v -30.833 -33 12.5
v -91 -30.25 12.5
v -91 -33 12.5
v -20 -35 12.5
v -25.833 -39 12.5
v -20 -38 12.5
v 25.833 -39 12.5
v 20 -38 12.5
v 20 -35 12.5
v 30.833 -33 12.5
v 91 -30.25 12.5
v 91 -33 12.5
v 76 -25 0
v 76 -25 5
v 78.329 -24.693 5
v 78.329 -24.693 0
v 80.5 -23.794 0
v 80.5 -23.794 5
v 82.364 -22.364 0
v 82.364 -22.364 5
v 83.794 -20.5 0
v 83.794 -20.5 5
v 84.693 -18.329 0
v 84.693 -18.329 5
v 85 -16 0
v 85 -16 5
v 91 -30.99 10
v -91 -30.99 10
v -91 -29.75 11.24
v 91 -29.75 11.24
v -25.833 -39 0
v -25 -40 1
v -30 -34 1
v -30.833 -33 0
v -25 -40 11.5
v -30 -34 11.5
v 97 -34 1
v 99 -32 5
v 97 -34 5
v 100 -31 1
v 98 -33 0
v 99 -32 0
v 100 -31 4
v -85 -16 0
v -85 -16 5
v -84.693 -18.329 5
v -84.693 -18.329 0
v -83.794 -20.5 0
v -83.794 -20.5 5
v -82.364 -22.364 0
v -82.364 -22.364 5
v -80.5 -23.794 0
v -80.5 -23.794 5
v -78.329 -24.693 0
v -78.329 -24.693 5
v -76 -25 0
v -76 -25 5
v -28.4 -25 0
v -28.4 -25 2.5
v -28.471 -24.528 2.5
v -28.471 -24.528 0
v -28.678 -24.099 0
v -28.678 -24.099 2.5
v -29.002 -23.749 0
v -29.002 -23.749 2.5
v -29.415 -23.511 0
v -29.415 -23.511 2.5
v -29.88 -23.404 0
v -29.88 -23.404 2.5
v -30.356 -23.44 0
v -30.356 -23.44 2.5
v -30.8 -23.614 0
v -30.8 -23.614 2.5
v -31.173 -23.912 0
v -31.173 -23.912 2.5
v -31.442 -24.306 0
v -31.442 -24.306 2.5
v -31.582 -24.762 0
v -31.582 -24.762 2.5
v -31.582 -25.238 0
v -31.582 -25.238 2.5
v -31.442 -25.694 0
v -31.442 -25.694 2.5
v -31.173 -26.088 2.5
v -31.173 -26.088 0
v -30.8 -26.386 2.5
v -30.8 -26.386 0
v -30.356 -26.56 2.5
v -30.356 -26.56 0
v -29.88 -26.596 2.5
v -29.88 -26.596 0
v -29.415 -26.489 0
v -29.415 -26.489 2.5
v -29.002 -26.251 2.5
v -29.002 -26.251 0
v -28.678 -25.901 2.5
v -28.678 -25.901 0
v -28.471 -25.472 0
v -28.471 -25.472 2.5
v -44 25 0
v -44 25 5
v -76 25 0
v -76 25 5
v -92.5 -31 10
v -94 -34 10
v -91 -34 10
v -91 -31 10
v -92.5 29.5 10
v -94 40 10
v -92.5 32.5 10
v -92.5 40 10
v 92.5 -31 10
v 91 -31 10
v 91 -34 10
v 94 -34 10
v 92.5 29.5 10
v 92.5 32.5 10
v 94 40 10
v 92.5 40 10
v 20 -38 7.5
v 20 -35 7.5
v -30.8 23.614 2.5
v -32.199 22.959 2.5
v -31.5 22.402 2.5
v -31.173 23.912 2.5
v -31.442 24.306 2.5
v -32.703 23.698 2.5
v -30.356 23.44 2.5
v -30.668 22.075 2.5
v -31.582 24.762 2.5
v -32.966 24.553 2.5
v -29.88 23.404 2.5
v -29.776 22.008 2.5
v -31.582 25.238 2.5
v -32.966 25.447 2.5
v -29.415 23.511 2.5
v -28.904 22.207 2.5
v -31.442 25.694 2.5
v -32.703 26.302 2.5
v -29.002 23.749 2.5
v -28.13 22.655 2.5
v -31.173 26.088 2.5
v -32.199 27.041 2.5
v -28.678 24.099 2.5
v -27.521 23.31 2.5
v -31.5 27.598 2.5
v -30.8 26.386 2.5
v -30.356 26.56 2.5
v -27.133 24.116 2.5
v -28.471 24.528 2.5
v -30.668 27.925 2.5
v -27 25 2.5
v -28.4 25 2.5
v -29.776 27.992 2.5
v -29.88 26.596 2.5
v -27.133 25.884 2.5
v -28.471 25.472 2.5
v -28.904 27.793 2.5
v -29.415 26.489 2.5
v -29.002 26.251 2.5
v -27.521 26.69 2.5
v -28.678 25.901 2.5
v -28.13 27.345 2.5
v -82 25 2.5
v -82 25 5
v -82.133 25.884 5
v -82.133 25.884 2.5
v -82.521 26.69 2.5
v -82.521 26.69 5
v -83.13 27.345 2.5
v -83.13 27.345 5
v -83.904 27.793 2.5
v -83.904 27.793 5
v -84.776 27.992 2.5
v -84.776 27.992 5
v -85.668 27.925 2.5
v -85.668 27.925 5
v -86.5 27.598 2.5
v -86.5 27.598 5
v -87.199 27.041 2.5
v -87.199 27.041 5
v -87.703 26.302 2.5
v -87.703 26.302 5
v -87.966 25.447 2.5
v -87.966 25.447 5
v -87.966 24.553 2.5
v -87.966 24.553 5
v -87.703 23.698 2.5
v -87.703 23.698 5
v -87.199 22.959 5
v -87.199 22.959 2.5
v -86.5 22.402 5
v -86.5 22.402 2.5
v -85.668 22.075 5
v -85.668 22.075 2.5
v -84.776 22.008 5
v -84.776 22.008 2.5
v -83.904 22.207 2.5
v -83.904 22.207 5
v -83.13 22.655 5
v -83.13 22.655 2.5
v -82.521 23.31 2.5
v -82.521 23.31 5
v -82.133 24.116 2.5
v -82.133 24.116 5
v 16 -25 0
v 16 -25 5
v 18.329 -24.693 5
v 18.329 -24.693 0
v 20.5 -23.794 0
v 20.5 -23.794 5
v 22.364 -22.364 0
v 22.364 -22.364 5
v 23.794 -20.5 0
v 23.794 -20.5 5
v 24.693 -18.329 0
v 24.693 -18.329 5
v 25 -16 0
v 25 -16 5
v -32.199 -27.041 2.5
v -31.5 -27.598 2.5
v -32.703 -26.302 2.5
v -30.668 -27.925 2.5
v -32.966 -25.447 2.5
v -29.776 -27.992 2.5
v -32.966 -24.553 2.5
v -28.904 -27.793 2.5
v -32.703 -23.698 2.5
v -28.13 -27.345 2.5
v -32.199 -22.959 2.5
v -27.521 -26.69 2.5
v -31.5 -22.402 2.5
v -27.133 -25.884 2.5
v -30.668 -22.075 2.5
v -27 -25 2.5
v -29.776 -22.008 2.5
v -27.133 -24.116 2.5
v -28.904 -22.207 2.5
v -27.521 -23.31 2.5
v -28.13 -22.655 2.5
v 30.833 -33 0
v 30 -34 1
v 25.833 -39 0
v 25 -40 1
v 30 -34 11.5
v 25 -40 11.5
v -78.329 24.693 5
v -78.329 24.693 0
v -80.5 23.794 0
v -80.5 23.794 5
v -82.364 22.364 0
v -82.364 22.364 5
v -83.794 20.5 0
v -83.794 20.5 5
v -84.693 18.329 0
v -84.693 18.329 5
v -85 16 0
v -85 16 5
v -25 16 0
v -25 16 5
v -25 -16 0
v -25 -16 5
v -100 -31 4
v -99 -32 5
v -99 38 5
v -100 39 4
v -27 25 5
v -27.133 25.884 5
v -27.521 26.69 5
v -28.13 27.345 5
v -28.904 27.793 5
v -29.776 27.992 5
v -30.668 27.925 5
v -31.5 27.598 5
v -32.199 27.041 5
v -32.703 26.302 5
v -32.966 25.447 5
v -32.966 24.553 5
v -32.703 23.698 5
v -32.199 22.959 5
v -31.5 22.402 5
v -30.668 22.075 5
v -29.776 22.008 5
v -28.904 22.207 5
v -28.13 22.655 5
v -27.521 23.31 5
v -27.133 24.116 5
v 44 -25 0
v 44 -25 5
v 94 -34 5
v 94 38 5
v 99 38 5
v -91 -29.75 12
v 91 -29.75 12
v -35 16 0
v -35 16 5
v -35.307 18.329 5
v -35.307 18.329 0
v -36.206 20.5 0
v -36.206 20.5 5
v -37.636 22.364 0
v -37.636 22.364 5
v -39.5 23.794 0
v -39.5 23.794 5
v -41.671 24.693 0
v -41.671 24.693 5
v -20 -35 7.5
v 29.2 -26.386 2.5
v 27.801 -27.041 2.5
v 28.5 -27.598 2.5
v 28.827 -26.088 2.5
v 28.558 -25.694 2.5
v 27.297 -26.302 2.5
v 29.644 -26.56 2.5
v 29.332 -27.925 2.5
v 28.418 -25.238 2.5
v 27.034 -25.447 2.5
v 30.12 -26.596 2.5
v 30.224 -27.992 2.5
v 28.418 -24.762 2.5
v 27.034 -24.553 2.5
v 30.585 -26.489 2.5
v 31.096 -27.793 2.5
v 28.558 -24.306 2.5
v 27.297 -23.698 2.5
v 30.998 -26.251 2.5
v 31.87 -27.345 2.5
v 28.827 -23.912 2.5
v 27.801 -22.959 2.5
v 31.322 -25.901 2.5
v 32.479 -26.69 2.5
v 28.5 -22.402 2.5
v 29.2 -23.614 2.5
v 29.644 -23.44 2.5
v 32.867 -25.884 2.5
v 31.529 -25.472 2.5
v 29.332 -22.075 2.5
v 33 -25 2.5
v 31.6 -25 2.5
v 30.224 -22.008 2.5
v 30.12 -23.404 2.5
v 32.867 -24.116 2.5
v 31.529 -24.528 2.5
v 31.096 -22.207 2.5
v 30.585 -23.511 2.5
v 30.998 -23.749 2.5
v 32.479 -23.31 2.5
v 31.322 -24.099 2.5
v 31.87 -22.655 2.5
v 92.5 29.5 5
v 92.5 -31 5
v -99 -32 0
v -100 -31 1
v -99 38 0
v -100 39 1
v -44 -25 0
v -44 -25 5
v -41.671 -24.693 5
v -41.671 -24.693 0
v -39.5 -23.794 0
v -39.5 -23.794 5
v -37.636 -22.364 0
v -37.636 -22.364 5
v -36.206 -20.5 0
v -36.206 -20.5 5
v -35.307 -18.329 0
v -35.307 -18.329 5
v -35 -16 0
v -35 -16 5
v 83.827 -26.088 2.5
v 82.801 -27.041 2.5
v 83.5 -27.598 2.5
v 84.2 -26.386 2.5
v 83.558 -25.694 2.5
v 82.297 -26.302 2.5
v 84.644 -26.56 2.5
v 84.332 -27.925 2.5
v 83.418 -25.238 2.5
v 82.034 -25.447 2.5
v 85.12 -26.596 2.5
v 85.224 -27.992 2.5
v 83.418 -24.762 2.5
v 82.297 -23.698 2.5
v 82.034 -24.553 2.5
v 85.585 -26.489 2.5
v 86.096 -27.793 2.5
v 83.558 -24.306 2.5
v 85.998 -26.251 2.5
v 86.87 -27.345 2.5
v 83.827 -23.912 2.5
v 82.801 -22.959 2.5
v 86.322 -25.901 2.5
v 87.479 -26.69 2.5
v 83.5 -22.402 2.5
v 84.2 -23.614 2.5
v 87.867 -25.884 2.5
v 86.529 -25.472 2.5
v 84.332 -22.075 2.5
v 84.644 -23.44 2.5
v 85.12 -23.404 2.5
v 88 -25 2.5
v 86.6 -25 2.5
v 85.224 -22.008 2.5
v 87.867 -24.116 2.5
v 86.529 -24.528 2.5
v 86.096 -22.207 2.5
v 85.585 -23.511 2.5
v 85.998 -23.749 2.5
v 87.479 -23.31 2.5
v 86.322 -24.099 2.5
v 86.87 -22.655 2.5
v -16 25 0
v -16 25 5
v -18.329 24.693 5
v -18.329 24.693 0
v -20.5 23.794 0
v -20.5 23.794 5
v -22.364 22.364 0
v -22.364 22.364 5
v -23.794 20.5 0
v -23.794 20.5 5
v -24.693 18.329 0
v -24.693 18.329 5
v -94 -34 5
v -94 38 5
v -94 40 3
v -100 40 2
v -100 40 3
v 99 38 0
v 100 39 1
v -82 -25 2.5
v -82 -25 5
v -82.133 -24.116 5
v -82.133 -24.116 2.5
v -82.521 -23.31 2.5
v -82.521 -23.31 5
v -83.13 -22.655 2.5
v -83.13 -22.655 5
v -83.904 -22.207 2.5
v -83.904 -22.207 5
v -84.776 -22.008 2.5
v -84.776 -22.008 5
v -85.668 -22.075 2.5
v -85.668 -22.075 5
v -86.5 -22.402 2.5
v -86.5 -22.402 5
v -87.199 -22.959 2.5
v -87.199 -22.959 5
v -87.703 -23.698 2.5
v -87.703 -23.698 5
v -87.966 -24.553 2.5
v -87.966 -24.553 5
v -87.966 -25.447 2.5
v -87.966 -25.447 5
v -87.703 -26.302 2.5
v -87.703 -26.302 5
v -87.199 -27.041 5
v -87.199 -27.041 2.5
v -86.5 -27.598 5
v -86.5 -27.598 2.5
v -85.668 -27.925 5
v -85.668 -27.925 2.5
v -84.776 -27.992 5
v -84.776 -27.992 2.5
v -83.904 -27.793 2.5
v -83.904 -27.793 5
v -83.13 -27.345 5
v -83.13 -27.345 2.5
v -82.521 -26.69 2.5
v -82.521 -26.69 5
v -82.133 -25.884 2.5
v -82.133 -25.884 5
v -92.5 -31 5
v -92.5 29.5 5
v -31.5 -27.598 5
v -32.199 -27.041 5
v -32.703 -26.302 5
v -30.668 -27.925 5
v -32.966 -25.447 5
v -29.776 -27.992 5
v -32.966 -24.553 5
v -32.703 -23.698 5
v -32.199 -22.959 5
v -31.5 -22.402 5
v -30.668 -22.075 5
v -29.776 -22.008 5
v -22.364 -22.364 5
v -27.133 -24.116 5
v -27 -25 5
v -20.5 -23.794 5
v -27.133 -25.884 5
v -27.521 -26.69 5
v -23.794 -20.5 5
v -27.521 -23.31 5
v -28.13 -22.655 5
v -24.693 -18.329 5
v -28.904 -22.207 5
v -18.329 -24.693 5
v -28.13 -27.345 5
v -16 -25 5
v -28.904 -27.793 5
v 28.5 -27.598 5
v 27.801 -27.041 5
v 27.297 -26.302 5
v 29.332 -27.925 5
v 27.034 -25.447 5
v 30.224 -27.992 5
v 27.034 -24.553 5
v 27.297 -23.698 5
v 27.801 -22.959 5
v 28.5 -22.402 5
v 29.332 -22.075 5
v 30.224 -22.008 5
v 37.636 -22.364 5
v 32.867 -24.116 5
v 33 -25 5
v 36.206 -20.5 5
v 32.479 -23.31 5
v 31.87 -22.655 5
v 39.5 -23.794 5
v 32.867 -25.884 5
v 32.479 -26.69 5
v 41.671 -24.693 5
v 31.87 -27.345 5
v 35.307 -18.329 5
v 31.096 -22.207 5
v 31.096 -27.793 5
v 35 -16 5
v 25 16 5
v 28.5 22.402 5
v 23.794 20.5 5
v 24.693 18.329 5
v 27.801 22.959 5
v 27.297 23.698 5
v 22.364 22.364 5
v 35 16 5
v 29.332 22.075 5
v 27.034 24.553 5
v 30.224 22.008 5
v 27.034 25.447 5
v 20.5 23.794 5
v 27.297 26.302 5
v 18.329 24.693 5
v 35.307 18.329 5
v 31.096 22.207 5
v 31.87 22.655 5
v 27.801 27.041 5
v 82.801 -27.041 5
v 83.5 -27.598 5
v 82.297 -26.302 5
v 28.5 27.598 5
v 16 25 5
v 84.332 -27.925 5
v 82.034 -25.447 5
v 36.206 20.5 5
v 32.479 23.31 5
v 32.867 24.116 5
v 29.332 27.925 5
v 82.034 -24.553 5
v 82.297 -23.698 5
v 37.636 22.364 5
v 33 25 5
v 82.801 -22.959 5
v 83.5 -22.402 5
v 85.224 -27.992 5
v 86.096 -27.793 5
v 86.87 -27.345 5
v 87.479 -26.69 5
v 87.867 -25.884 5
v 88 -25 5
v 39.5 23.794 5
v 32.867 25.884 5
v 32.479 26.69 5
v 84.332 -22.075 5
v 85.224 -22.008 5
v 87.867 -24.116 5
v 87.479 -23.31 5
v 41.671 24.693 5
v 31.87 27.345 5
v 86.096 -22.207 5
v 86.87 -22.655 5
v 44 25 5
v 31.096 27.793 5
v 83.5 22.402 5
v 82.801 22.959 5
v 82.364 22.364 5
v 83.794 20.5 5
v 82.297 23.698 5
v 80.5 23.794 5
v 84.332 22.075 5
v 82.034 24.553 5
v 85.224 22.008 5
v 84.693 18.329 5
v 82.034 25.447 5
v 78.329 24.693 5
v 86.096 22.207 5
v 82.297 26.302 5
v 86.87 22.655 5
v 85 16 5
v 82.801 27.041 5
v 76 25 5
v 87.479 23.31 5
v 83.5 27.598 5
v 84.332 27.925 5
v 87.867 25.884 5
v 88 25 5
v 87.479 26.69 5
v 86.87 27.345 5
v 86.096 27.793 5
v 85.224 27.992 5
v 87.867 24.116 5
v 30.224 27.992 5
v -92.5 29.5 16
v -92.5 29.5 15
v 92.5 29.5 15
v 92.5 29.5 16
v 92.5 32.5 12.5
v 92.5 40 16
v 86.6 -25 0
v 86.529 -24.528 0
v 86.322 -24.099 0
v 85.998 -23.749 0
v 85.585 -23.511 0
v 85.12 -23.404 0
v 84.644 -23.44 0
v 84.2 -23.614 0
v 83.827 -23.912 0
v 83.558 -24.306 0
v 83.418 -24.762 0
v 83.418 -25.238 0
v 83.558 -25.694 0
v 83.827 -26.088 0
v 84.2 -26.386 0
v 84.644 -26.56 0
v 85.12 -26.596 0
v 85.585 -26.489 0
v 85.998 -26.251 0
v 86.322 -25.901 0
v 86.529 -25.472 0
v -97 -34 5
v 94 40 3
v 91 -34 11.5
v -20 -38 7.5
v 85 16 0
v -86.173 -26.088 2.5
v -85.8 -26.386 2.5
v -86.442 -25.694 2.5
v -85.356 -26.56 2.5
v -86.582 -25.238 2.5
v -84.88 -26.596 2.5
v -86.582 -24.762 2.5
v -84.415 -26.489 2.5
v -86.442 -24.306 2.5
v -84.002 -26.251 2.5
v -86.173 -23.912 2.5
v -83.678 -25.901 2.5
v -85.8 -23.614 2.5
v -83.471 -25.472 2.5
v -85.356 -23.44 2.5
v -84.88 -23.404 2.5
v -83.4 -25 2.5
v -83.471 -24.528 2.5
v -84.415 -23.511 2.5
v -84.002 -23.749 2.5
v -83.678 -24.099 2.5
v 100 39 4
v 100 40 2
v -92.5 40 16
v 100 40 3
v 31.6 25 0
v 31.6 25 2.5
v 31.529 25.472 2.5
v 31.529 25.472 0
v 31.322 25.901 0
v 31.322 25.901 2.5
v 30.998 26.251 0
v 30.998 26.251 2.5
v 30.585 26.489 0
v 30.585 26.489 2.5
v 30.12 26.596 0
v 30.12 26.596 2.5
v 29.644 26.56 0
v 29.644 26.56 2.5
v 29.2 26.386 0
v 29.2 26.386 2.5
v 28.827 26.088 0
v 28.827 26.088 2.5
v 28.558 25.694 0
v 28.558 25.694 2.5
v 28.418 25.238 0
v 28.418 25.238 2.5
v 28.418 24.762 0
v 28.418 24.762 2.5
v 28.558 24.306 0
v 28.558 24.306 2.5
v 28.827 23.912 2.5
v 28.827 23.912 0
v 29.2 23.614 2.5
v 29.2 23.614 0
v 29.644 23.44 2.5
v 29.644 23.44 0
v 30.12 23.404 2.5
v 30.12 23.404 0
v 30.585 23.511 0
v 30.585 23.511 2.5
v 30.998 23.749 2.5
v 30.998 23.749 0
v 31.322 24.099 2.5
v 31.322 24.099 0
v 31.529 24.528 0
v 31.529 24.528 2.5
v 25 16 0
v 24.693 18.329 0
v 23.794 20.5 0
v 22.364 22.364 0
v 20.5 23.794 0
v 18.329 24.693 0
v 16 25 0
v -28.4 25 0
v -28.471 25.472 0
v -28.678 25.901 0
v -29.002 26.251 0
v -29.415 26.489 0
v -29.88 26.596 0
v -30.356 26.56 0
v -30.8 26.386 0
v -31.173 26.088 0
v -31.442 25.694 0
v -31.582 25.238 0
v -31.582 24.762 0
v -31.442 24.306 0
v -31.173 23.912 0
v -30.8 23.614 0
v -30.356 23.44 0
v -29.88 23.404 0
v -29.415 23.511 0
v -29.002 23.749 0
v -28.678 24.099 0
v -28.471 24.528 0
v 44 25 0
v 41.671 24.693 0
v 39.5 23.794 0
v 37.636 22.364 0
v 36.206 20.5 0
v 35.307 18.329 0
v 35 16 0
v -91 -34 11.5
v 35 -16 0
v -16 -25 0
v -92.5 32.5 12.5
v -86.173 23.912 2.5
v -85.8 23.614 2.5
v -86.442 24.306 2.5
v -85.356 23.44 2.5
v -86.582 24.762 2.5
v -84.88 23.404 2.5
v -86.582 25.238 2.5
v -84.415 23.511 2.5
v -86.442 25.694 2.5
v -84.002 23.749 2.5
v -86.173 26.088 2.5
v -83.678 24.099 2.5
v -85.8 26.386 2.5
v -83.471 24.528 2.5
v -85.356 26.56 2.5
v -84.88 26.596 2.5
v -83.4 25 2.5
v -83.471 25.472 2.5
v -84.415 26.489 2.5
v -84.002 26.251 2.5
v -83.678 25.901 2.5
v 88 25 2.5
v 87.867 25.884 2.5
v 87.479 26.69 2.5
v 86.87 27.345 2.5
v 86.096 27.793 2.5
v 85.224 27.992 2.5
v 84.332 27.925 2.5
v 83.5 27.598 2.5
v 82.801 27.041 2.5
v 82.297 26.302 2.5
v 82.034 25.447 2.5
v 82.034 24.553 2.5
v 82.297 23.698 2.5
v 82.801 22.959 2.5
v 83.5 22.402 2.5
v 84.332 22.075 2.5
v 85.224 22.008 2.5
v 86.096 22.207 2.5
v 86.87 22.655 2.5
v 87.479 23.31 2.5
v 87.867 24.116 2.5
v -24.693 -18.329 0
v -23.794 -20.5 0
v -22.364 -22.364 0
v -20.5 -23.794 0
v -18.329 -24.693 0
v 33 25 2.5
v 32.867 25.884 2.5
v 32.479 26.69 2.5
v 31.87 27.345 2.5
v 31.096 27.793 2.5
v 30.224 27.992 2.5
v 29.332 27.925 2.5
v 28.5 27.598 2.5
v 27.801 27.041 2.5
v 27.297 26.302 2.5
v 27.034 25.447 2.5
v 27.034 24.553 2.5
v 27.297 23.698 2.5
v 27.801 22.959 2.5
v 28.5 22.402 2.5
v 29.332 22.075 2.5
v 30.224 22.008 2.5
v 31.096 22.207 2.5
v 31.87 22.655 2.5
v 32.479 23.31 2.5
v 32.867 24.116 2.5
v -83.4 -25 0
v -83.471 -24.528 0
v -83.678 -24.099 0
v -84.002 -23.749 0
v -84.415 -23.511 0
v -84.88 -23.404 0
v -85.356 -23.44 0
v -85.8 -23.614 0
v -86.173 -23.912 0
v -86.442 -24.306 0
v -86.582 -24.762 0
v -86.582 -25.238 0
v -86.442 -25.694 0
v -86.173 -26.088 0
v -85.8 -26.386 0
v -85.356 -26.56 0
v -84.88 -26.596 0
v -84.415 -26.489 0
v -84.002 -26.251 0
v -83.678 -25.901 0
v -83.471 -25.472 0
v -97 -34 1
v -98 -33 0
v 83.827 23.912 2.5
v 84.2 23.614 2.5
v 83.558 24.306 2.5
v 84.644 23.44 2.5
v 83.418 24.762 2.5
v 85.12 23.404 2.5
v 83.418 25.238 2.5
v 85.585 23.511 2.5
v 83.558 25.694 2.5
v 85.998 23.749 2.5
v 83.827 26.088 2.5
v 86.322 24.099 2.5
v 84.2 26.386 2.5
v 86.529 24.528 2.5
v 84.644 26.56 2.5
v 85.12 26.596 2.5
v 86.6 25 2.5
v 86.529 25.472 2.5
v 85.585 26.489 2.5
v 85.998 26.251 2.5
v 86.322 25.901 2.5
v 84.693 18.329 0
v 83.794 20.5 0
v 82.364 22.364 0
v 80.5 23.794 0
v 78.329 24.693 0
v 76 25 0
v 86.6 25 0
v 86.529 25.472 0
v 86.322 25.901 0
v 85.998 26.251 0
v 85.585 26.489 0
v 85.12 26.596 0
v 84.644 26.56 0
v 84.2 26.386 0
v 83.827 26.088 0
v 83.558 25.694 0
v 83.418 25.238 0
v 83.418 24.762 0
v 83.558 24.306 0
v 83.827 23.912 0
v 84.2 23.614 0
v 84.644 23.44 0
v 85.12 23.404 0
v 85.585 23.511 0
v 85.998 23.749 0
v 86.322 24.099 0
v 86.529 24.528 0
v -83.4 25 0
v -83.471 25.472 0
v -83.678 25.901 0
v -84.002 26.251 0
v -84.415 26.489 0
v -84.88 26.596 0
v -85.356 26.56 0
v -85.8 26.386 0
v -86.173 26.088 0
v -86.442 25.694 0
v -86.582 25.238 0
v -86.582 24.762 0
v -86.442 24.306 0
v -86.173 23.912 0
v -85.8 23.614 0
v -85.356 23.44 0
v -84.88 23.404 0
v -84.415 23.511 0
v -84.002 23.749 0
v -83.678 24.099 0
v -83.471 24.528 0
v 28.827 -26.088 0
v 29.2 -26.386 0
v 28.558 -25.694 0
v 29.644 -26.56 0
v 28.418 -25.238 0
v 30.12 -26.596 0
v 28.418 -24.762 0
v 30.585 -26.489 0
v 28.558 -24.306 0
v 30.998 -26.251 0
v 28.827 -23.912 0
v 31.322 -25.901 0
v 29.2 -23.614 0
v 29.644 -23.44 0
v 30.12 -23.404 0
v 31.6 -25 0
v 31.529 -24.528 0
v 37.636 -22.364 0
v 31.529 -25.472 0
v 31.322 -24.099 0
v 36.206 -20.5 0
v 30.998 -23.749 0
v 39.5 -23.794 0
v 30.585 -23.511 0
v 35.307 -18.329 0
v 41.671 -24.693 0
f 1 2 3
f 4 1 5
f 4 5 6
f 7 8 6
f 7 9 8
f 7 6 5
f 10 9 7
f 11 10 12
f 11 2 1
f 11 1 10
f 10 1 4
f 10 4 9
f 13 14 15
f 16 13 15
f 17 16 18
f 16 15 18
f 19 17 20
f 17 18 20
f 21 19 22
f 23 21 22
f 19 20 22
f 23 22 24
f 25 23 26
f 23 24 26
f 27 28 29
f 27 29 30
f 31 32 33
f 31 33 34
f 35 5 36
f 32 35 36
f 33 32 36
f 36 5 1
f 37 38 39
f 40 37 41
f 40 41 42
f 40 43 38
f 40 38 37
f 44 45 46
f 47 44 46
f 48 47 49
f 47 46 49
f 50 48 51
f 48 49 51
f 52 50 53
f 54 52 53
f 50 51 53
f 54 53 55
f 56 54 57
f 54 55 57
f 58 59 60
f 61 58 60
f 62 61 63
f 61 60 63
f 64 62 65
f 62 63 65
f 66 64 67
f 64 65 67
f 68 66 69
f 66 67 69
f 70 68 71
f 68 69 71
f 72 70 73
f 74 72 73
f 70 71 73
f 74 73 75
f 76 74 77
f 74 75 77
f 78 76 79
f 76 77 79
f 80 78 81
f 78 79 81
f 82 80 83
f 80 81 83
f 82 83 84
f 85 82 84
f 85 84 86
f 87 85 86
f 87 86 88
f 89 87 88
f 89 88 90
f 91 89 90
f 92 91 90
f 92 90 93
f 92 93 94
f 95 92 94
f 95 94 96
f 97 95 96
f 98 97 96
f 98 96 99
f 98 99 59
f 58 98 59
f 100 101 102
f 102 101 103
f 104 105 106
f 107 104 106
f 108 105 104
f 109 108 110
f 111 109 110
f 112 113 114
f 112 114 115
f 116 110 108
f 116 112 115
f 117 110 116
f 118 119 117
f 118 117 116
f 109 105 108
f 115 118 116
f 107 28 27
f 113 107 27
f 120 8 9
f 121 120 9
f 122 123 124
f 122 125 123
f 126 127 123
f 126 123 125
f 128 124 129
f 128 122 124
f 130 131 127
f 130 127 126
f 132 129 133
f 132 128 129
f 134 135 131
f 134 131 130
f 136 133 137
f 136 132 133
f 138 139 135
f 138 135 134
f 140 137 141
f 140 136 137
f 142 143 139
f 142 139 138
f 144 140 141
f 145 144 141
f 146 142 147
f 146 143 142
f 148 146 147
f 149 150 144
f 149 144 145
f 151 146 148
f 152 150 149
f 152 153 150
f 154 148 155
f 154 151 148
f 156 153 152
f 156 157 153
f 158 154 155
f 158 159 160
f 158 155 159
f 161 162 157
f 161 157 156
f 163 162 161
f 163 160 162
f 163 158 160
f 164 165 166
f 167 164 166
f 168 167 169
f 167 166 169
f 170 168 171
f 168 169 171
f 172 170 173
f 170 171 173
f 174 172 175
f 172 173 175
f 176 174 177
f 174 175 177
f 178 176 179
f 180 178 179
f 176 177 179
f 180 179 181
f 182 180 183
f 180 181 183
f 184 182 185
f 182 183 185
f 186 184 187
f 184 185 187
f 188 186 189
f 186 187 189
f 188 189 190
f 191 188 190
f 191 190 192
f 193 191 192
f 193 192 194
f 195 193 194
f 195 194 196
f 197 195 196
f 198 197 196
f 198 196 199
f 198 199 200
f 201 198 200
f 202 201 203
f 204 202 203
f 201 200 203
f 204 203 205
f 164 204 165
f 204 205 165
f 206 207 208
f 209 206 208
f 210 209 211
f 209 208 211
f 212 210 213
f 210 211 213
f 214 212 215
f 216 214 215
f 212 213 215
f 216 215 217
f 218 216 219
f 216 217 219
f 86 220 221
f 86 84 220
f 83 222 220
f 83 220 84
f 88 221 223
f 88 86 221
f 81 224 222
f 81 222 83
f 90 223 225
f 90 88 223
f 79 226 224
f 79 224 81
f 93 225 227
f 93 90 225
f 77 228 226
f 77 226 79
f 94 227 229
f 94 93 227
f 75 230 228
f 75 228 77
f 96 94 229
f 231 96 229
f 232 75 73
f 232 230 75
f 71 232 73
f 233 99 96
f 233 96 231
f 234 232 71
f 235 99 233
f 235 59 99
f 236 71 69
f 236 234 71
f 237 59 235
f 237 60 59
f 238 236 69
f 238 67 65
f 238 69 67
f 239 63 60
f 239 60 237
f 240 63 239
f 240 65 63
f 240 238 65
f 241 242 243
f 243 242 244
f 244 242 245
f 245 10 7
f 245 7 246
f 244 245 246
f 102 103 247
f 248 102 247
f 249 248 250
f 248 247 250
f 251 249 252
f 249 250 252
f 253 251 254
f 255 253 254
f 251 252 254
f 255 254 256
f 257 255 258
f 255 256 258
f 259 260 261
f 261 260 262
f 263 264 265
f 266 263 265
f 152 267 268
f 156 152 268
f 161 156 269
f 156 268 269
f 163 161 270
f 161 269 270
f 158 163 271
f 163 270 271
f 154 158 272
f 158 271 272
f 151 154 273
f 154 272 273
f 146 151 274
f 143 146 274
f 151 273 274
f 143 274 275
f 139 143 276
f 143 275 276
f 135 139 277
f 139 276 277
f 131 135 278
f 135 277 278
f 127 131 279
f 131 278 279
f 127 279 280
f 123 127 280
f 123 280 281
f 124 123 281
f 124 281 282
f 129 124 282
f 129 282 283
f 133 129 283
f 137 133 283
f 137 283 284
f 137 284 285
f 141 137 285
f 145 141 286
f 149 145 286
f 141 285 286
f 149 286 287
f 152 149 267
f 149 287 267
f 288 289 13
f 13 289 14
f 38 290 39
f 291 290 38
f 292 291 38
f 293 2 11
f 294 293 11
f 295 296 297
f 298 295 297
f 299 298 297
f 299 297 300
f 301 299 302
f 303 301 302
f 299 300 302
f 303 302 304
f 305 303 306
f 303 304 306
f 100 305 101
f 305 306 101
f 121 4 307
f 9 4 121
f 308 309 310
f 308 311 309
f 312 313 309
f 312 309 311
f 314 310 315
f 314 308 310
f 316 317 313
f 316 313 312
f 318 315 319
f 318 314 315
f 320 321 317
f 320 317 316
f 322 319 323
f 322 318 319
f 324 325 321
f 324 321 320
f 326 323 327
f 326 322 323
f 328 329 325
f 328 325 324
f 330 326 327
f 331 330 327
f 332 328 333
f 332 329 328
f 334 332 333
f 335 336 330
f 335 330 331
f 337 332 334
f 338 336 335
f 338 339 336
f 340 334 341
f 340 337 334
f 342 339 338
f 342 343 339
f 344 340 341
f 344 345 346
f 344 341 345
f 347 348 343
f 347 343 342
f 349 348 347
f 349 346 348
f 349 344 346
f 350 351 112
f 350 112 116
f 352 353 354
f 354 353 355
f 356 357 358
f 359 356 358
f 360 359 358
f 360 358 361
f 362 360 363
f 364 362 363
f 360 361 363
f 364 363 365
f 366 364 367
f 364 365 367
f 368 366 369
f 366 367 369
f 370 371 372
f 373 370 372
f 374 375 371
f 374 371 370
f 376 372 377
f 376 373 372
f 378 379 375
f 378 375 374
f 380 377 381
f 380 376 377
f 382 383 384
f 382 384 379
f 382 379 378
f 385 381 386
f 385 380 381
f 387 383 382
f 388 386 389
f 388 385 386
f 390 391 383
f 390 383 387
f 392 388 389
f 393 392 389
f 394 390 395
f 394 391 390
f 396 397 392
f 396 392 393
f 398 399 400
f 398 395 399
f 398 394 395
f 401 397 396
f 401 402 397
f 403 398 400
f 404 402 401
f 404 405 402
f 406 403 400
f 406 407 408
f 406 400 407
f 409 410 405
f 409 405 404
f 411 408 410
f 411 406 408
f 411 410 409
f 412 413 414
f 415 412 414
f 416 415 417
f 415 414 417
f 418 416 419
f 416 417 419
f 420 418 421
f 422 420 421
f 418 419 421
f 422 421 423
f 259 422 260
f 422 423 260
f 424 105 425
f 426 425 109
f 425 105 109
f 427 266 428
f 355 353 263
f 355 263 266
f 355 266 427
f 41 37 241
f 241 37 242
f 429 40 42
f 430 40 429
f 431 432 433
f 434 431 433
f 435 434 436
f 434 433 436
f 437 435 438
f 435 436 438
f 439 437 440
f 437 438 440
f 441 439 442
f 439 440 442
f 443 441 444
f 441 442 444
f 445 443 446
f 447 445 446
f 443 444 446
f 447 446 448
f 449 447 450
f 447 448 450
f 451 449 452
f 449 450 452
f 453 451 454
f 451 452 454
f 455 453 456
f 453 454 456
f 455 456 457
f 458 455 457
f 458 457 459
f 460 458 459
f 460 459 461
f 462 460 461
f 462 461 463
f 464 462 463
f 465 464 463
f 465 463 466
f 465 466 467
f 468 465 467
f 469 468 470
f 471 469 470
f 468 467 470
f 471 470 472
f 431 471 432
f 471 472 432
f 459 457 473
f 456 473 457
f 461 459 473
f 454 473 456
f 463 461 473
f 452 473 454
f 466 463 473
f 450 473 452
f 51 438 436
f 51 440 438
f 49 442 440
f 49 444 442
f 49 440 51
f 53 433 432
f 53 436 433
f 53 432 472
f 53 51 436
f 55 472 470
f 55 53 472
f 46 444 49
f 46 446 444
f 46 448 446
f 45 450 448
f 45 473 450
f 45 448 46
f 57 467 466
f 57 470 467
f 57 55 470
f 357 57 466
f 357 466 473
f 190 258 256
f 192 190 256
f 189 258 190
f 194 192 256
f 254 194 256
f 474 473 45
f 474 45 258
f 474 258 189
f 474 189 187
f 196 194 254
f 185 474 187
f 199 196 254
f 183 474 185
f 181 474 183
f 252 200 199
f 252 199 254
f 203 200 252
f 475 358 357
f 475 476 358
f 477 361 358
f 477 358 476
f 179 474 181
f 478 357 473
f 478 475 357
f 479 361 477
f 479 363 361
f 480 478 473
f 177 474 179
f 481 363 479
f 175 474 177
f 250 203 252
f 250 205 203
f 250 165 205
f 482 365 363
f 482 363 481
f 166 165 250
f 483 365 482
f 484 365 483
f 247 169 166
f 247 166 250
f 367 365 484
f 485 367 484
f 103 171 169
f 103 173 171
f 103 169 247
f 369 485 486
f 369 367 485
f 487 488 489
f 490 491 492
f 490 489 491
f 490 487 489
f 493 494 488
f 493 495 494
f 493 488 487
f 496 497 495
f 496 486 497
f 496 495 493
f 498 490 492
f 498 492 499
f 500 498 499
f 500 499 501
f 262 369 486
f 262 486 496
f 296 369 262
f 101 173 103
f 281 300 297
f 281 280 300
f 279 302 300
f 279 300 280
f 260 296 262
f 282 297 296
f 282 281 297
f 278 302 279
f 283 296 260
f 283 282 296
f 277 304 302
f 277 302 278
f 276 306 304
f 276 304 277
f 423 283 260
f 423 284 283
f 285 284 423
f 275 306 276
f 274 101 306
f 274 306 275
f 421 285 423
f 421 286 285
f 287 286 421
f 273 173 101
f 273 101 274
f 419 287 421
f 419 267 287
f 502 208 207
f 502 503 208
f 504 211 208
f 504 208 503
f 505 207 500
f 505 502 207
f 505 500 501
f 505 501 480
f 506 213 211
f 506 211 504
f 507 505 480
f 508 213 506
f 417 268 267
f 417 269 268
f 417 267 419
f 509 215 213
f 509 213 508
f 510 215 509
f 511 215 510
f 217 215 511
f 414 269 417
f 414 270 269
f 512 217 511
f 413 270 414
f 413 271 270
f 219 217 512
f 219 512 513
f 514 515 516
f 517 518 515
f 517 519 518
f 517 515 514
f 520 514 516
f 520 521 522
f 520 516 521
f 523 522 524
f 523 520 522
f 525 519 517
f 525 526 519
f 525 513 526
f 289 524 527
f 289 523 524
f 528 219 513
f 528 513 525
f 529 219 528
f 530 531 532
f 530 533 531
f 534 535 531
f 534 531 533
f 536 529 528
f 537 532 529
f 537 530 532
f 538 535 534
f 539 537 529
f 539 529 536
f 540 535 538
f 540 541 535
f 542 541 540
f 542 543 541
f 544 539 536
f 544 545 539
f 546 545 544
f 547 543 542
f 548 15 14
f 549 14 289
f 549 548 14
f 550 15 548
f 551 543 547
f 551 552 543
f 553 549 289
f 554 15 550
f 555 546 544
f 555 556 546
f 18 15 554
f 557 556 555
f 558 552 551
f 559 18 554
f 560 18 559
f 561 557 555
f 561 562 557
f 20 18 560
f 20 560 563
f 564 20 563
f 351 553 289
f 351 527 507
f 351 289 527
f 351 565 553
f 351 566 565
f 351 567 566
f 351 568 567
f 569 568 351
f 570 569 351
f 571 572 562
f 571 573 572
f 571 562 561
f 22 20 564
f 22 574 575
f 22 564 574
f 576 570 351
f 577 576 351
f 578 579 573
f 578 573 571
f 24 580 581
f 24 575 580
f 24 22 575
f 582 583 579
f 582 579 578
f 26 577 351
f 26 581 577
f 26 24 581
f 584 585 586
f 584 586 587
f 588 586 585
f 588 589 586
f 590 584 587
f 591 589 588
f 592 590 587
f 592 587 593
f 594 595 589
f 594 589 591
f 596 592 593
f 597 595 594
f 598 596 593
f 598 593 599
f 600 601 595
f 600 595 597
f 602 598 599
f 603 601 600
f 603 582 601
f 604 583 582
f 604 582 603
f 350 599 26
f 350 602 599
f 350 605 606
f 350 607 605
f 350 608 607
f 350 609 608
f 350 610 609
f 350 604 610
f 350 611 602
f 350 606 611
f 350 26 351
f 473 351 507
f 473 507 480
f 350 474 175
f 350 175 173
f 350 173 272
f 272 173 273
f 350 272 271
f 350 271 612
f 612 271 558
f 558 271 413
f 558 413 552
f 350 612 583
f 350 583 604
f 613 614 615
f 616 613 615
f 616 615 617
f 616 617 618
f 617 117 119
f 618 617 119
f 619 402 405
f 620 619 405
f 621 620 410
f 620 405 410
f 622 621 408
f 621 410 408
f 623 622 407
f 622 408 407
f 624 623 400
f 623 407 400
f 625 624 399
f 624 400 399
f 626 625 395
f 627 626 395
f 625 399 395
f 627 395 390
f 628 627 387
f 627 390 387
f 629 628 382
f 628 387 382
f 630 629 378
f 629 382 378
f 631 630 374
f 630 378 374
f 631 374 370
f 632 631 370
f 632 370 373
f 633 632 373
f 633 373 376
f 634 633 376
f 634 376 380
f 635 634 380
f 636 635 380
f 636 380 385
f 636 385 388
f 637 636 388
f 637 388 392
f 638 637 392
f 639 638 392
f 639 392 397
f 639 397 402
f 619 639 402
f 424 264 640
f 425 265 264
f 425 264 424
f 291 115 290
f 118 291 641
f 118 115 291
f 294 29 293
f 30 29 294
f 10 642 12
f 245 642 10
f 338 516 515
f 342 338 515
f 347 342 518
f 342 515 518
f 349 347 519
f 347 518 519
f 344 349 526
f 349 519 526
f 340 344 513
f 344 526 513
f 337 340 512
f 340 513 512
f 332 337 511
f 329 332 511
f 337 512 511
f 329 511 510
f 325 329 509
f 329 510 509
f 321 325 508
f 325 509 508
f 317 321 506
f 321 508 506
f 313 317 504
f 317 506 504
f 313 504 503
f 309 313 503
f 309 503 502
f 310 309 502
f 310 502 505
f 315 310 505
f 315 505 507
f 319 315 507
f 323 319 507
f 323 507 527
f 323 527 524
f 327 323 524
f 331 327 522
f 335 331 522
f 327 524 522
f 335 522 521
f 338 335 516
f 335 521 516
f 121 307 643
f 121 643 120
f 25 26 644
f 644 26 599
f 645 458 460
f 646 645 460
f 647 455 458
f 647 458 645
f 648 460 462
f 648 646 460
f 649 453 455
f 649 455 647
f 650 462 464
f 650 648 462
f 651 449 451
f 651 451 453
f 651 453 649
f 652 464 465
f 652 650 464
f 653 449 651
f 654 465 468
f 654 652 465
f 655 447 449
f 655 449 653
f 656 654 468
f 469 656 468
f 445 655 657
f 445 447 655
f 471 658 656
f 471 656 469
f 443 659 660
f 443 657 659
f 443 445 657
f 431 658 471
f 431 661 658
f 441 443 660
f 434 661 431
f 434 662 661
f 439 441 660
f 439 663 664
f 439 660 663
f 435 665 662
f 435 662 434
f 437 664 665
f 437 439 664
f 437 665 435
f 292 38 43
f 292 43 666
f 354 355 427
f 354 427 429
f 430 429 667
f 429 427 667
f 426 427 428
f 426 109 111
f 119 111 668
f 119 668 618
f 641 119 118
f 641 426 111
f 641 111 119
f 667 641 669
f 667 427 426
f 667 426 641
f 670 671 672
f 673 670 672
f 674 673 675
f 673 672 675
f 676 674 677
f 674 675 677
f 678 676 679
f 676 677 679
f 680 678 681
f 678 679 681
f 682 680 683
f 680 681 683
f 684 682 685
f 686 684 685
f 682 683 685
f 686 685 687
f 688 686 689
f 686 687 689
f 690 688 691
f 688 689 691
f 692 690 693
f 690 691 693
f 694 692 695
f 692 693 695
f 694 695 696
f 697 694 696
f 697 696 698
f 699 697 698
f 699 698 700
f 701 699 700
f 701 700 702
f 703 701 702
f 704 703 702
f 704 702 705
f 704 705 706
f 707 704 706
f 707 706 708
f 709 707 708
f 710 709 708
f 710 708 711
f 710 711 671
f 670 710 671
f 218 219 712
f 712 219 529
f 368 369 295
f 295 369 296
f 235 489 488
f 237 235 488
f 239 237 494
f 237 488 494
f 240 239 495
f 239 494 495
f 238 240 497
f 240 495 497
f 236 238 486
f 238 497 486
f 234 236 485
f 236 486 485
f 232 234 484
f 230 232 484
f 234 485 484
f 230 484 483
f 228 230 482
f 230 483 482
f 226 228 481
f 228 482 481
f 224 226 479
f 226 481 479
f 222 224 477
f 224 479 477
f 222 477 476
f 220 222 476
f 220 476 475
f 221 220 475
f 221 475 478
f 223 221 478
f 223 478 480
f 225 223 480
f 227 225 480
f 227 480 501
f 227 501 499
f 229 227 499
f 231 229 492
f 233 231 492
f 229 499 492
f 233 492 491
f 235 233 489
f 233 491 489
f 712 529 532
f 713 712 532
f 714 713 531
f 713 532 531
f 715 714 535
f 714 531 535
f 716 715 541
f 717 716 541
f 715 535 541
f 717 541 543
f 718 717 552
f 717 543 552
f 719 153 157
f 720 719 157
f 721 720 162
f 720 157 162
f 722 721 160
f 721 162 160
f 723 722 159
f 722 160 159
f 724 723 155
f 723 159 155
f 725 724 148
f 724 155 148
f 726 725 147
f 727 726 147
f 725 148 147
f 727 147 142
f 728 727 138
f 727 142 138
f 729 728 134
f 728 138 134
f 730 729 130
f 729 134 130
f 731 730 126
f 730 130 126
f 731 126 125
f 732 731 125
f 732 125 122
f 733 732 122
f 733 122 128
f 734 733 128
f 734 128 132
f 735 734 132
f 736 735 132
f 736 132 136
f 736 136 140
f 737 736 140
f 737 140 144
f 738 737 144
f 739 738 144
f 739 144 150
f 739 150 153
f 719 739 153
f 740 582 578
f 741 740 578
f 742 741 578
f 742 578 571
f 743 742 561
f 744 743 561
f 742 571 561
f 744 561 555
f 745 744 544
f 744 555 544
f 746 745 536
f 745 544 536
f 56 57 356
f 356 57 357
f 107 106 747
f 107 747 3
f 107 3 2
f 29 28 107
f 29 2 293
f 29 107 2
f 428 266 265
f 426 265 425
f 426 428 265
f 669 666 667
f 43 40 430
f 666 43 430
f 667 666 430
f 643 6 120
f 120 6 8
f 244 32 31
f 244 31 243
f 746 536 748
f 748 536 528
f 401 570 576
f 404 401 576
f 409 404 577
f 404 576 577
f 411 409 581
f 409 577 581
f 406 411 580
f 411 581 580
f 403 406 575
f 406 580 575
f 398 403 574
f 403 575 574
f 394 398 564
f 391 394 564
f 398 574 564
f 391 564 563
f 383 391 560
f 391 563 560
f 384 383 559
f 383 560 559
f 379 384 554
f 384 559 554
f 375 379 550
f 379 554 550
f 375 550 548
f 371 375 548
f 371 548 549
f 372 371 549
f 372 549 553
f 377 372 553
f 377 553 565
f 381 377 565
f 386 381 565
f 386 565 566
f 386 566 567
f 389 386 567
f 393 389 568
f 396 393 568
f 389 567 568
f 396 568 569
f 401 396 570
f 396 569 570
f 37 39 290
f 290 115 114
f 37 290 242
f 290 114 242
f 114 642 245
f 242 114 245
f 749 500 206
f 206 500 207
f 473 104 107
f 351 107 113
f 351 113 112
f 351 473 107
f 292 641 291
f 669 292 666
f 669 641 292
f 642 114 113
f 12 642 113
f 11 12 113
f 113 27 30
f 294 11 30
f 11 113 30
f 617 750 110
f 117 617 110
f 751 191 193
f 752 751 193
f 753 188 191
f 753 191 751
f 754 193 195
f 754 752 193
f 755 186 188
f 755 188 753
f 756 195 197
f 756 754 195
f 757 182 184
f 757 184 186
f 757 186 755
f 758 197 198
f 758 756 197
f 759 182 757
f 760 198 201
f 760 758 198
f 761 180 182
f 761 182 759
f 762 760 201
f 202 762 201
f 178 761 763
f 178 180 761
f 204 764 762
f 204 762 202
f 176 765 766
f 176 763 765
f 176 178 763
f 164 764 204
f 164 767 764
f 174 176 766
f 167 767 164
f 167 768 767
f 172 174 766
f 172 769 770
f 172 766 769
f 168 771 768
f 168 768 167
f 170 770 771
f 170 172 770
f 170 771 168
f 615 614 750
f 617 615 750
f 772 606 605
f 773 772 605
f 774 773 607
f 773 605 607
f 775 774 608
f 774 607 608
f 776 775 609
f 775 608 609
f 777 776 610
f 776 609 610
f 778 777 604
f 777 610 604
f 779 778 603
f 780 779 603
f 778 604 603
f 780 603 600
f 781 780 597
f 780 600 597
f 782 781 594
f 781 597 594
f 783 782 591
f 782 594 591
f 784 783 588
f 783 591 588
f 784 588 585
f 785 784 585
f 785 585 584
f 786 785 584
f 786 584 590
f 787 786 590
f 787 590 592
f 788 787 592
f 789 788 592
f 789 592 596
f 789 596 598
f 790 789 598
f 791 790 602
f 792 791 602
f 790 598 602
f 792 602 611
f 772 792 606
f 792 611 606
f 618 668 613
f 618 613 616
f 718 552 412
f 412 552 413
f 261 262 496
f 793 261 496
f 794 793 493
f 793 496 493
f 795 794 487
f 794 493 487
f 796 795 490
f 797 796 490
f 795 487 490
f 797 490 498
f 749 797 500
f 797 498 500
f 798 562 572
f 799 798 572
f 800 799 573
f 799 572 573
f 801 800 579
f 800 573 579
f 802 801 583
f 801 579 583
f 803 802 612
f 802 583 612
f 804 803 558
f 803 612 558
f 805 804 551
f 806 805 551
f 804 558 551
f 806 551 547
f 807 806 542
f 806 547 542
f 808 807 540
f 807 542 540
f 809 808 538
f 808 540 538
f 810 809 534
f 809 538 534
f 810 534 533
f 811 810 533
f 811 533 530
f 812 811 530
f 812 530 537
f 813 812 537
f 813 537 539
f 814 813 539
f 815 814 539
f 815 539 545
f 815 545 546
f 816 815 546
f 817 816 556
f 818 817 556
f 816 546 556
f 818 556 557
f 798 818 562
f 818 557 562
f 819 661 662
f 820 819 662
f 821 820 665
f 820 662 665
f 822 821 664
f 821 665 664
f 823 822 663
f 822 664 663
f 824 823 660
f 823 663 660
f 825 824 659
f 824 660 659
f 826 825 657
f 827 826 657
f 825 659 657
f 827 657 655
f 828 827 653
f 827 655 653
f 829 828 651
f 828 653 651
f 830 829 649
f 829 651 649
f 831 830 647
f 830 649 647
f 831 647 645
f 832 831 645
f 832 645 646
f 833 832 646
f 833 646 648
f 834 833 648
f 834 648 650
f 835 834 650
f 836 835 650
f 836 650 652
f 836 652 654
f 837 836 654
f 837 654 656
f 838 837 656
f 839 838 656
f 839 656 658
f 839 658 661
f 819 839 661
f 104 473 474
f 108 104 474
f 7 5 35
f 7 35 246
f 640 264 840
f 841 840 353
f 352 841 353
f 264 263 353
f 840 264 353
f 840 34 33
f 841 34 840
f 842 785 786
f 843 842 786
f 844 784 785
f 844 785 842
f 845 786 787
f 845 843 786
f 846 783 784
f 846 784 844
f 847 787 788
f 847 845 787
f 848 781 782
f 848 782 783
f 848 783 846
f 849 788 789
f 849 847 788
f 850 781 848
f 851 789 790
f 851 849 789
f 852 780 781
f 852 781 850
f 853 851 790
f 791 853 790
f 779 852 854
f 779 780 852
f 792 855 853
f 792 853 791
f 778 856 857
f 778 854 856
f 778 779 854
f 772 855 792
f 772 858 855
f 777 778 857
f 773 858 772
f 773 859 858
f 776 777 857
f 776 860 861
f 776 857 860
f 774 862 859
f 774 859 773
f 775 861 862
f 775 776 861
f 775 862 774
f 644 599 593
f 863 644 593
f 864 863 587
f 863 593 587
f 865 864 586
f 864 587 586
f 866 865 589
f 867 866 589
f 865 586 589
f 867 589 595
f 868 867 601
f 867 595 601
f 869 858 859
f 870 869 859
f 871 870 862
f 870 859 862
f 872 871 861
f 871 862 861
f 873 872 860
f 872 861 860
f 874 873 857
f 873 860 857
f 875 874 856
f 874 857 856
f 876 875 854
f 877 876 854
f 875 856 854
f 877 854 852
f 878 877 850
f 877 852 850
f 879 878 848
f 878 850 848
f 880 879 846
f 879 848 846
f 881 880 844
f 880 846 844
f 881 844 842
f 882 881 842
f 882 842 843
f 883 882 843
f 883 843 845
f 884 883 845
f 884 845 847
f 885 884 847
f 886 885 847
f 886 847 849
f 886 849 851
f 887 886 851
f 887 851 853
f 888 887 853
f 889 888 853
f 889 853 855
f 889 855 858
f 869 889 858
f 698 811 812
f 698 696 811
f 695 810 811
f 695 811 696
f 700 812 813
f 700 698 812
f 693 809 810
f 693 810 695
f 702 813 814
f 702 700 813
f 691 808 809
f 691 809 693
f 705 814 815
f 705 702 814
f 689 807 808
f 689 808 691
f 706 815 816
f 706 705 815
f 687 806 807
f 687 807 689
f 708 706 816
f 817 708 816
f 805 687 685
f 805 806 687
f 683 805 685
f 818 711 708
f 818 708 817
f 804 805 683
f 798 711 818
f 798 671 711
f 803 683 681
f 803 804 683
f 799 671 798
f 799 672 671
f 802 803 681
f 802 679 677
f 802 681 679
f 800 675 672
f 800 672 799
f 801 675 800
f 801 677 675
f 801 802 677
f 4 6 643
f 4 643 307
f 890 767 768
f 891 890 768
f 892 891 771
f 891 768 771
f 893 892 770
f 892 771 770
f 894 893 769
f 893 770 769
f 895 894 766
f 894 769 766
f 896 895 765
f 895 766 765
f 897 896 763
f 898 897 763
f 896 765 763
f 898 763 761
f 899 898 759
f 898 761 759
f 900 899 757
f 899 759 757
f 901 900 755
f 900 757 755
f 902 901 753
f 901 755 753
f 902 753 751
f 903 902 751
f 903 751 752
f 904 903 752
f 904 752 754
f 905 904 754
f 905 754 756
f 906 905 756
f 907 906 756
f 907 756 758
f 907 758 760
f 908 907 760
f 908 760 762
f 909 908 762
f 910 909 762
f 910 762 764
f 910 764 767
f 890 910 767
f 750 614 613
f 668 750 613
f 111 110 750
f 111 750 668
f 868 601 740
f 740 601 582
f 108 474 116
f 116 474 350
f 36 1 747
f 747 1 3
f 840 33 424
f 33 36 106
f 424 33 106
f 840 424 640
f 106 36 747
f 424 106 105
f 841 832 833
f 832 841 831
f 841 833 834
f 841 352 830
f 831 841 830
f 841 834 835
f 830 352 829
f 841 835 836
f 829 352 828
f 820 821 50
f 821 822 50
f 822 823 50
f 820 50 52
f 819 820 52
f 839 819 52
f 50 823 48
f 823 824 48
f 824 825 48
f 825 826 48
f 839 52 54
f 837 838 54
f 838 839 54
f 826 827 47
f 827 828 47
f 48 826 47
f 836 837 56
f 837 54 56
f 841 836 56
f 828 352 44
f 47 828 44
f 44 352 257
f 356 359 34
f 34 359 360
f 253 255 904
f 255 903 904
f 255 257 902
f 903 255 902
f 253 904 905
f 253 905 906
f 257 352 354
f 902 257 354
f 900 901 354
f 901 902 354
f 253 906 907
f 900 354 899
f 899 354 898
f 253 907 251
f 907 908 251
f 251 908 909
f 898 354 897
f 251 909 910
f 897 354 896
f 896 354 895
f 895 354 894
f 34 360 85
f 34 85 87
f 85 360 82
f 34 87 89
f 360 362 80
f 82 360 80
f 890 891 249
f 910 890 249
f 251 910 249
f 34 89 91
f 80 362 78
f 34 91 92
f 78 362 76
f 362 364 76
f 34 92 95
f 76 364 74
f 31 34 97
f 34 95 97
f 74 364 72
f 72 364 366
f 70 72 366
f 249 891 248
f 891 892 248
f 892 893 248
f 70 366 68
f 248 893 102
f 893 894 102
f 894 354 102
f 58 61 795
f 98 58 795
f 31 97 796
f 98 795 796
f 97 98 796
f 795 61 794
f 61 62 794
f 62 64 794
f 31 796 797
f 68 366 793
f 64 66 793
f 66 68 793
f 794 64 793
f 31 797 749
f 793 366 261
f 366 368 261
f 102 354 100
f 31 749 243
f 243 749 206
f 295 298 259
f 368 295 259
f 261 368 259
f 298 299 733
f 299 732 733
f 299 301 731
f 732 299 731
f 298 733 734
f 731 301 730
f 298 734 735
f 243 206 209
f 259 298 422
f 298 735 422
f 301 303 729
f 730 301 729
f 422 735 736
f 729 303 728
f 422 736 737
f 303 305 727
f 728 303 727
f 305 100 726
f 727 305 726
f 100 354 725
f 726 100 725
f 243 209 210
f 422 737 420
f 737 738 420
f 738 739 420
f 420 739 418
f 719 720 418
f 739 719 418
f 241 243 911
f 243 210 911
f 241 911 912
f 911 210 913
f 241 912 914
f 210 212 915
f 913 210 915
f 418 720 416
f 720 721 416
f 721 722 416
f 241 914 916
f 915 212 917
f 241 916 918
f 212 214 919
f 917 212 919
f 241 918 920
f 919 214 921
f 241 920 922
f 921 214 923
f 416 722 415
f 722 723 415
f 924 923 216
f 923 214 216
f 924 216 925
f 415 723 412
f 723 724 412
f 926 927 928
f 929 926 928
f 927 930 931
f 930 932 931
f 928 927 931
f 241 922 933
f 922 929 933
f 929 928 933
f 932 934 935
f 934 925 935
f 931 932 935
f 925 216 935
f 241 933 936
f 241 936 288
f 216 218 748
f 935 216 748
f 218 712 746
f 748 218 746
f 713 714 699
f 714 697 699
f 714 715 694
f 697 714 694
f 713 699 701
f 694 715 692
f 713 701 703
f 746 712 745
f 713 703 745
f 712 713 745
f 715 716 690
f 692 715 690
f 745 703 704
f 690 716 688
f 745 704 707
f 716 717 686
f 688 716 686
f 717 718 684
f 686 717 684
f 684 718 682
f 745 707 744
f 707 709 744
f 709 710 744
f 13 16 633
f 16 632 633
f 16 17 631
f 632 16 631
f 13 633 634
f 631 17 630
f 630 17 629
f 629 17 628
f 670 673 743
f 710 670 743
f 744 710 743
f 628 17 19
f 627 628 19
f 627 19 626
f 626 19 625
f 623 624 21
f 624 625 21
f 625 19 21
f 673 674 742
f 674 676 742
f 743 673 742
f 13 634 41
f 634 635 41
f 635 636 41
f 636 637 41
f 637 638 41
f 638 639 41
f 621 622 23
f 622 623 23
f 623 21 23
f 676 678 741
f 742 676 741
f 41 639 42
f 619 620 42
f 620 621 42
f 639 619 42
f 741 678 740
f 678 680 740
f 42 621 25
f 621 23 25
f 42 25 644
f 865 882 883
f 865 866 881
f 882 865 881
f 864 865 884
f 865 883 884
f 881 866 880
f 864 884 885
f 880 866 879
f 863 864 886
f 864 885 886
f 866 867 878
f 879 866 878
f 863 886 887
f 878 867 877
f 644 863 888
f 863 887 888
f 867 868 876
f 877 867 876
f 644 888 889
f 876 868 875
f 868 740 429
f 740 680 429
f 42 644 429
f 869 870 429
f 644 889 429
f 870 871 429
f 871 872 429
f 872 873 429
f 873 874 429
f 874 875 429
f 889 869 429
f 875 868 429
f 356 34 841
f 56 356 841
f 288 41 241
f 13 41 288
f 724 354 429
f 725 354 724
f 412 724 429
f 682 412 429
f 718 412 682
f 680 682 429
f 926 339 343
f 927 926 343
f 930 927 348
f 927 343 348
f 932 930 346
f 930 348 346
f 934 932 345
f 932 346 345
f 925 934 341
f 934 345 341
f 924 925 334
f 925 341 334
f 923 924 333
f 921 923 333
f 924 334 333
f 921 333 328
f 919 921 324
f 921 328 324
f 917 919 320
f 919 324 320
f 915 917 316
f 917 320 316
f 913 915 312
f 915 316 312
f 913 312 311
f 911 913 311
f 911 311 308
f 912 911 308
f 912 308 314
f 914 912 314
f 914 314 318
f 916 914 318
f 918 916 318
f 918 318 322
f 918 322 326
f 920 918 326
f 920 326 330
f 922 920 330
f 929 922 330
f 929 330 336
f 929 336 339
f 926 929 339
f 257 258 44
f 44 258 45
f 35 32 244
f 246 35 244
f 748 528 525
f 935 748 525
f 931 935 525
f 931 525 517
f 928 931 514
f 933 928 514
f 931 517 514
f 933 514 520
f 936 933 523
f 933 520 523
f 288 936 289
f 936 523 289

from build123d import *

# Parameters (mm, degrees)
SKETCH_W        = 200
SKETCH_H        = 80
PAD_DEPTH       = 5
SKETCH001_W     = 200
SKETCH001_H     = 80
SKETCH001_W_2   = 185
SKETCH001_H_2   = 60.5
PAD001_DEPTH    = 5
SKETCH002_W     = 185
SKETCH002_H     = 10.5
PAD002_DEPTH    = 6
SKETCH003_W     = 182
SKETCH003_H     = 10.25
PAD003_DEPTH    = 2.5
POCKET_DEPTH    = 192.501
SKETCH005_R     = 1.6
POCKET001_DEPTH = 5
SKETCH006_R     = 3
POCKET002_DEPTH = 2.5
SKETCH007_W     = 6
SKETCH007_H     = 80
POCKET003_DEPTH = 5
CHAMFER_SIZE    = 2
SKETCH008_W     = 40
SKETCH008_H     = 3
POCKET004_DEPTH = 5
POCKET005_DEPTH = 12.501
CHAMFER001_SIZE = 3
CHAMFER002_SIZE = 1
CHAMFER003_SIZE = 1
CHAMFER004_SIZE = 1
CHAMFER005_SIZE = 1.24
CHAMFER006_SIZE = 0.5


with BuildPart() as part:
    # Sketch → Pad (new body)
    with BuildSketch(Plane.XY):
        Rectangle(SKETCH_W, SKETCH_H)
    extrude(amount=PAD_DEPTH)

    # Sketch001 (on Face6 of Pad) → Pad001 (join)
    with BuildSketch(Plane.XY.offset(5)):
        Rectangle(SKETCH001_W, SKETCH001_H)
        with Locations((0, -0.75)):
            Rectangle(SKETCH001_W_2, SKETCH001_H_2, mode=Mode.SUBTRACT)
    extrude(amount=PAD001_DEPTH)

    # Sketch002 (on Face3 of Pad001) → Pad002 (join)
    with BuildSketch(Plane.XY.offset(10)):
        with Locations((0, 34.75)):
            Rectangle(SKETCH002_W, SKETCH002_H)
    extrude(amount=PAD002_DEPTH)

    # Sketch003 (on Face5 of Pad002) → Pad003 (join)
    with BuildSketch(Plane.XY.offset(10)):
        with Locations((0, -34.875)):
            Rectangle(SKETCH003_W, SKETCH003_H)
    extrude(amount=PAD003_DEPTH)

    # Sketch004 (on Face7 of Pad003) → Pocket (cut, through all)
    with BuildSketch(Plane(origin=(-92.5, 0, 0), x_dir=(0, -1, 0), z_dir=(-1, 0, 0))):
        Polygon((-32.5, 12.5), (-32.5, 10), (-29.5, 10), (-29.5, 15), align=None)
    extrude(amount=-POCKET_DEPTH, mode=Mode.SUBTRACT)

    # Sketch005 (on Face21 of Pocket) → Pocket001 (cut)
    with BuildSketch(Plane.XY.offset(5)):
        with Locations((-85, -25)):
            Circle(SKETCH005_R)
        with Locations((-30, -25)):
            Circle(SKETCH005_R)
        with Locations((30, -25)):
            Circle(SKETCH005_R)
        with Locations((85, -25)):
            Circle(SKETCH005_R)
        with Locations((85, 25)):
            Circle(SKETCH005_R)
        with Locations((30, 25)):
            Circle(SKETCH005_R)
        with Locations((-30, 25)):
            Circle(SKETCH005_R)
        with Locations((-85, 25)):
            Circle(SKETCH005_R)
        with BuildLine():
            Line((-25, 16), (-25, -16))
            ThreePointArc((-25, -16), (-22.363961, -22.363961), (-16, -25))
            Line((-16, -25), (16, -25))
            ThreePointArc((16, -25), (22.363961, -22.363961), (25, -16))
            Line((25, -16), (25, 16))
            ThreePointArc((25, 16), (22.363961, 22.363961), (16, 25))
            Line((16, 25), (-16, 25))
            ThreePointArc((-16, 25), (-22.363961, 22.363961), (-25, 16))
        make_face()
        with BuildLine():
            Line((-85, 16), (-85, -16))
            ThreePointArc((-85, -16), (-82.363961, -22.363961), (-76, -25))
            Line((-76, -25), (-44, -25))
            ThreePointArc((-44, -25), (-37.636039, -22.363961), (-35, -16))
            Line((-35, -16), (-35, 16))
            ThreePointArc((-35, 16), (-37.636039, 22.363961), (-44, 25))
            Line((-44, 25), (-76, 25))
            ThreePointArc((-76, 25), (-82.363961, 22.363961), (-85, 16))
        make_face()
        with BuildLine():
            Line((35, 16), (35, -16))
            ThreePointArc((35, -16), (37.636039, -22.363961), (44, -25))
            Line((44, -25), (76, -25))
            ThreePointArc((76, -25), (82.363961, -22.363961), (85, -16))
            Line((85, -16), (85, 16))
            ThreePointArc((85, 16), (82.363961, 22.363961), (76, 25))
            Line((76, 25), (44, 25))
            ThreePointArc((44, 25), (37.636039, 22.363961), (35, 16))
        make_face()
    extrude(amount=-POCKET001_DEPTH, mode=Mode.SUBTRACT)

    # Sketch006 (on Face45 of Pocket001) → Pocket002 (cut)
    with BuildSketch(Plane.XY.offset(5)):
        with Locations((-85, 25)):
            Circle(SKETCH006_R)
        with Locations((-85, -25)):
            Circle(SKETCH006_R)
        with Locations((-30, -25)):
            Circle(SKETCH006_R)
        with Locations((-30, 25)):
            Circle(SKETCH006_R)
        with Locations((30, 25)):
            Circle(SKETCH006_R)
        with Locations((30, -25)):
            Circle(SKETCH006_R)
        with Locations((85, -25)):
            Circle(SKETCH006_R)
        with Locations((85, 25)):
            Circle(SKETCH006_R)
    extrude(amount=-POCKET002_DEPTH, mode=Mode.SUBTRACT)

    # Sketch007 (on Face38 of Pocket002) → Pocket003 (cut)
    with BuildSketch(Plane.XY.offset(10)):
        with Locations((-97, 0)):
            Rectangle(SKETCH007_W, SKETCH007_H)
        with Locations((97, 0)):
            Rectangle(SKETCH007_W, SKETCH007_H)
    extrude(amount=-POCKET003_DEPTH, mode=Mode.SUBTRACT)

    # Chamfer
    chamfer_edges = [part.edges().sort_by_distance(p)[0] for p in [
        (-97, 40, 5),
        (0, 40, 0),
        (97, 40, 5),
    ]]
    chamfer(chamfer_edges, length=CHAMFER_SIZE)

    # Sketch008 (on Face44 of Chamfer) → Pocket004 (cut)
    with BuildSketch(Plane.XY.offset(12.5)):
        with Locations((0, -36.5)):
            Rectangle(SKETCH008_W, SKETCH008_H)
    extrude(amount=-POCKET004_DEPTH, mode=Mode.SUBTRACT)

    # Sketch009 (on Face44 of Pocket004) → Pocket005 (cut, through all)
    with BuildSketch(Plane.XY.offset(12.5)):
        Polygon((-100, -34), (-100, -40), (-25, -40), (-30, -34), align=None)
        Polygon((30, -34), (25, -40), (100, -40), (100, -34), align=None)
    extrude(amount=-POCKET005_DEPTH, mode=Mode.SUBTRACT)

    # Chamfer001
    chamfer001_edges = [part.edges().sort_by_distance(p)[0] for p in [
        (-100, -34, 2.5),
        (100, -34, 2.5),
    ]]
    chamfer(chamfer001_edges, length=CHAMFER001_SIZE)

    # Chamfer002
    chamfer002_edges = [part.edges().sort_by_distance(p)[0] for p in [
        (-60.5, -34, 12.5),
        (-63.5, -34, 0),
        (60.5, -34, 12.5),
        (63.5, -34, 0),
    ]]
    chamfer(chamfer002_edges, length=CHAMFER002_SIZE)

    # Chamfer003
    chamfer003_edges = [part.edges().sort_by_distance(p)[0] for p in [
        (0, -40, 12.5),
        (0, -40, 0),
    ]]
    chamfer(chamfer003_edges, length=CHAMFER003_SIZE)

    # Chamfer004
    chamfer004_edges = [part.edges().sort_by_distance(p)[0] for p in [
        (100, 3.5, 5),
        (100, 3.5, 0),
        (-100, 3.5, 5),
        (-100, 3.5, 0),
    ]]
    chamfer(chamfer004_edges, length=CHAMFER004_SIZE)

    # Chamfer005
    chamfer005_edges = [part.edges().sort_by_distance(p)[0] for p in [
        (0, -29.75, 10),
    ]]
    chamfer(chamfer005_edges, length=CHAMFER005_SIZE)

    # Chamfer006
    chamfer006_edges = [part.edges().sort_by_distance(p)[0] for p in [
        (0, -29.75, 12.5),
    ]]
    chamfer(chamfer006_edges, length=CHAMFER006_SIZE)


solid = part.part
